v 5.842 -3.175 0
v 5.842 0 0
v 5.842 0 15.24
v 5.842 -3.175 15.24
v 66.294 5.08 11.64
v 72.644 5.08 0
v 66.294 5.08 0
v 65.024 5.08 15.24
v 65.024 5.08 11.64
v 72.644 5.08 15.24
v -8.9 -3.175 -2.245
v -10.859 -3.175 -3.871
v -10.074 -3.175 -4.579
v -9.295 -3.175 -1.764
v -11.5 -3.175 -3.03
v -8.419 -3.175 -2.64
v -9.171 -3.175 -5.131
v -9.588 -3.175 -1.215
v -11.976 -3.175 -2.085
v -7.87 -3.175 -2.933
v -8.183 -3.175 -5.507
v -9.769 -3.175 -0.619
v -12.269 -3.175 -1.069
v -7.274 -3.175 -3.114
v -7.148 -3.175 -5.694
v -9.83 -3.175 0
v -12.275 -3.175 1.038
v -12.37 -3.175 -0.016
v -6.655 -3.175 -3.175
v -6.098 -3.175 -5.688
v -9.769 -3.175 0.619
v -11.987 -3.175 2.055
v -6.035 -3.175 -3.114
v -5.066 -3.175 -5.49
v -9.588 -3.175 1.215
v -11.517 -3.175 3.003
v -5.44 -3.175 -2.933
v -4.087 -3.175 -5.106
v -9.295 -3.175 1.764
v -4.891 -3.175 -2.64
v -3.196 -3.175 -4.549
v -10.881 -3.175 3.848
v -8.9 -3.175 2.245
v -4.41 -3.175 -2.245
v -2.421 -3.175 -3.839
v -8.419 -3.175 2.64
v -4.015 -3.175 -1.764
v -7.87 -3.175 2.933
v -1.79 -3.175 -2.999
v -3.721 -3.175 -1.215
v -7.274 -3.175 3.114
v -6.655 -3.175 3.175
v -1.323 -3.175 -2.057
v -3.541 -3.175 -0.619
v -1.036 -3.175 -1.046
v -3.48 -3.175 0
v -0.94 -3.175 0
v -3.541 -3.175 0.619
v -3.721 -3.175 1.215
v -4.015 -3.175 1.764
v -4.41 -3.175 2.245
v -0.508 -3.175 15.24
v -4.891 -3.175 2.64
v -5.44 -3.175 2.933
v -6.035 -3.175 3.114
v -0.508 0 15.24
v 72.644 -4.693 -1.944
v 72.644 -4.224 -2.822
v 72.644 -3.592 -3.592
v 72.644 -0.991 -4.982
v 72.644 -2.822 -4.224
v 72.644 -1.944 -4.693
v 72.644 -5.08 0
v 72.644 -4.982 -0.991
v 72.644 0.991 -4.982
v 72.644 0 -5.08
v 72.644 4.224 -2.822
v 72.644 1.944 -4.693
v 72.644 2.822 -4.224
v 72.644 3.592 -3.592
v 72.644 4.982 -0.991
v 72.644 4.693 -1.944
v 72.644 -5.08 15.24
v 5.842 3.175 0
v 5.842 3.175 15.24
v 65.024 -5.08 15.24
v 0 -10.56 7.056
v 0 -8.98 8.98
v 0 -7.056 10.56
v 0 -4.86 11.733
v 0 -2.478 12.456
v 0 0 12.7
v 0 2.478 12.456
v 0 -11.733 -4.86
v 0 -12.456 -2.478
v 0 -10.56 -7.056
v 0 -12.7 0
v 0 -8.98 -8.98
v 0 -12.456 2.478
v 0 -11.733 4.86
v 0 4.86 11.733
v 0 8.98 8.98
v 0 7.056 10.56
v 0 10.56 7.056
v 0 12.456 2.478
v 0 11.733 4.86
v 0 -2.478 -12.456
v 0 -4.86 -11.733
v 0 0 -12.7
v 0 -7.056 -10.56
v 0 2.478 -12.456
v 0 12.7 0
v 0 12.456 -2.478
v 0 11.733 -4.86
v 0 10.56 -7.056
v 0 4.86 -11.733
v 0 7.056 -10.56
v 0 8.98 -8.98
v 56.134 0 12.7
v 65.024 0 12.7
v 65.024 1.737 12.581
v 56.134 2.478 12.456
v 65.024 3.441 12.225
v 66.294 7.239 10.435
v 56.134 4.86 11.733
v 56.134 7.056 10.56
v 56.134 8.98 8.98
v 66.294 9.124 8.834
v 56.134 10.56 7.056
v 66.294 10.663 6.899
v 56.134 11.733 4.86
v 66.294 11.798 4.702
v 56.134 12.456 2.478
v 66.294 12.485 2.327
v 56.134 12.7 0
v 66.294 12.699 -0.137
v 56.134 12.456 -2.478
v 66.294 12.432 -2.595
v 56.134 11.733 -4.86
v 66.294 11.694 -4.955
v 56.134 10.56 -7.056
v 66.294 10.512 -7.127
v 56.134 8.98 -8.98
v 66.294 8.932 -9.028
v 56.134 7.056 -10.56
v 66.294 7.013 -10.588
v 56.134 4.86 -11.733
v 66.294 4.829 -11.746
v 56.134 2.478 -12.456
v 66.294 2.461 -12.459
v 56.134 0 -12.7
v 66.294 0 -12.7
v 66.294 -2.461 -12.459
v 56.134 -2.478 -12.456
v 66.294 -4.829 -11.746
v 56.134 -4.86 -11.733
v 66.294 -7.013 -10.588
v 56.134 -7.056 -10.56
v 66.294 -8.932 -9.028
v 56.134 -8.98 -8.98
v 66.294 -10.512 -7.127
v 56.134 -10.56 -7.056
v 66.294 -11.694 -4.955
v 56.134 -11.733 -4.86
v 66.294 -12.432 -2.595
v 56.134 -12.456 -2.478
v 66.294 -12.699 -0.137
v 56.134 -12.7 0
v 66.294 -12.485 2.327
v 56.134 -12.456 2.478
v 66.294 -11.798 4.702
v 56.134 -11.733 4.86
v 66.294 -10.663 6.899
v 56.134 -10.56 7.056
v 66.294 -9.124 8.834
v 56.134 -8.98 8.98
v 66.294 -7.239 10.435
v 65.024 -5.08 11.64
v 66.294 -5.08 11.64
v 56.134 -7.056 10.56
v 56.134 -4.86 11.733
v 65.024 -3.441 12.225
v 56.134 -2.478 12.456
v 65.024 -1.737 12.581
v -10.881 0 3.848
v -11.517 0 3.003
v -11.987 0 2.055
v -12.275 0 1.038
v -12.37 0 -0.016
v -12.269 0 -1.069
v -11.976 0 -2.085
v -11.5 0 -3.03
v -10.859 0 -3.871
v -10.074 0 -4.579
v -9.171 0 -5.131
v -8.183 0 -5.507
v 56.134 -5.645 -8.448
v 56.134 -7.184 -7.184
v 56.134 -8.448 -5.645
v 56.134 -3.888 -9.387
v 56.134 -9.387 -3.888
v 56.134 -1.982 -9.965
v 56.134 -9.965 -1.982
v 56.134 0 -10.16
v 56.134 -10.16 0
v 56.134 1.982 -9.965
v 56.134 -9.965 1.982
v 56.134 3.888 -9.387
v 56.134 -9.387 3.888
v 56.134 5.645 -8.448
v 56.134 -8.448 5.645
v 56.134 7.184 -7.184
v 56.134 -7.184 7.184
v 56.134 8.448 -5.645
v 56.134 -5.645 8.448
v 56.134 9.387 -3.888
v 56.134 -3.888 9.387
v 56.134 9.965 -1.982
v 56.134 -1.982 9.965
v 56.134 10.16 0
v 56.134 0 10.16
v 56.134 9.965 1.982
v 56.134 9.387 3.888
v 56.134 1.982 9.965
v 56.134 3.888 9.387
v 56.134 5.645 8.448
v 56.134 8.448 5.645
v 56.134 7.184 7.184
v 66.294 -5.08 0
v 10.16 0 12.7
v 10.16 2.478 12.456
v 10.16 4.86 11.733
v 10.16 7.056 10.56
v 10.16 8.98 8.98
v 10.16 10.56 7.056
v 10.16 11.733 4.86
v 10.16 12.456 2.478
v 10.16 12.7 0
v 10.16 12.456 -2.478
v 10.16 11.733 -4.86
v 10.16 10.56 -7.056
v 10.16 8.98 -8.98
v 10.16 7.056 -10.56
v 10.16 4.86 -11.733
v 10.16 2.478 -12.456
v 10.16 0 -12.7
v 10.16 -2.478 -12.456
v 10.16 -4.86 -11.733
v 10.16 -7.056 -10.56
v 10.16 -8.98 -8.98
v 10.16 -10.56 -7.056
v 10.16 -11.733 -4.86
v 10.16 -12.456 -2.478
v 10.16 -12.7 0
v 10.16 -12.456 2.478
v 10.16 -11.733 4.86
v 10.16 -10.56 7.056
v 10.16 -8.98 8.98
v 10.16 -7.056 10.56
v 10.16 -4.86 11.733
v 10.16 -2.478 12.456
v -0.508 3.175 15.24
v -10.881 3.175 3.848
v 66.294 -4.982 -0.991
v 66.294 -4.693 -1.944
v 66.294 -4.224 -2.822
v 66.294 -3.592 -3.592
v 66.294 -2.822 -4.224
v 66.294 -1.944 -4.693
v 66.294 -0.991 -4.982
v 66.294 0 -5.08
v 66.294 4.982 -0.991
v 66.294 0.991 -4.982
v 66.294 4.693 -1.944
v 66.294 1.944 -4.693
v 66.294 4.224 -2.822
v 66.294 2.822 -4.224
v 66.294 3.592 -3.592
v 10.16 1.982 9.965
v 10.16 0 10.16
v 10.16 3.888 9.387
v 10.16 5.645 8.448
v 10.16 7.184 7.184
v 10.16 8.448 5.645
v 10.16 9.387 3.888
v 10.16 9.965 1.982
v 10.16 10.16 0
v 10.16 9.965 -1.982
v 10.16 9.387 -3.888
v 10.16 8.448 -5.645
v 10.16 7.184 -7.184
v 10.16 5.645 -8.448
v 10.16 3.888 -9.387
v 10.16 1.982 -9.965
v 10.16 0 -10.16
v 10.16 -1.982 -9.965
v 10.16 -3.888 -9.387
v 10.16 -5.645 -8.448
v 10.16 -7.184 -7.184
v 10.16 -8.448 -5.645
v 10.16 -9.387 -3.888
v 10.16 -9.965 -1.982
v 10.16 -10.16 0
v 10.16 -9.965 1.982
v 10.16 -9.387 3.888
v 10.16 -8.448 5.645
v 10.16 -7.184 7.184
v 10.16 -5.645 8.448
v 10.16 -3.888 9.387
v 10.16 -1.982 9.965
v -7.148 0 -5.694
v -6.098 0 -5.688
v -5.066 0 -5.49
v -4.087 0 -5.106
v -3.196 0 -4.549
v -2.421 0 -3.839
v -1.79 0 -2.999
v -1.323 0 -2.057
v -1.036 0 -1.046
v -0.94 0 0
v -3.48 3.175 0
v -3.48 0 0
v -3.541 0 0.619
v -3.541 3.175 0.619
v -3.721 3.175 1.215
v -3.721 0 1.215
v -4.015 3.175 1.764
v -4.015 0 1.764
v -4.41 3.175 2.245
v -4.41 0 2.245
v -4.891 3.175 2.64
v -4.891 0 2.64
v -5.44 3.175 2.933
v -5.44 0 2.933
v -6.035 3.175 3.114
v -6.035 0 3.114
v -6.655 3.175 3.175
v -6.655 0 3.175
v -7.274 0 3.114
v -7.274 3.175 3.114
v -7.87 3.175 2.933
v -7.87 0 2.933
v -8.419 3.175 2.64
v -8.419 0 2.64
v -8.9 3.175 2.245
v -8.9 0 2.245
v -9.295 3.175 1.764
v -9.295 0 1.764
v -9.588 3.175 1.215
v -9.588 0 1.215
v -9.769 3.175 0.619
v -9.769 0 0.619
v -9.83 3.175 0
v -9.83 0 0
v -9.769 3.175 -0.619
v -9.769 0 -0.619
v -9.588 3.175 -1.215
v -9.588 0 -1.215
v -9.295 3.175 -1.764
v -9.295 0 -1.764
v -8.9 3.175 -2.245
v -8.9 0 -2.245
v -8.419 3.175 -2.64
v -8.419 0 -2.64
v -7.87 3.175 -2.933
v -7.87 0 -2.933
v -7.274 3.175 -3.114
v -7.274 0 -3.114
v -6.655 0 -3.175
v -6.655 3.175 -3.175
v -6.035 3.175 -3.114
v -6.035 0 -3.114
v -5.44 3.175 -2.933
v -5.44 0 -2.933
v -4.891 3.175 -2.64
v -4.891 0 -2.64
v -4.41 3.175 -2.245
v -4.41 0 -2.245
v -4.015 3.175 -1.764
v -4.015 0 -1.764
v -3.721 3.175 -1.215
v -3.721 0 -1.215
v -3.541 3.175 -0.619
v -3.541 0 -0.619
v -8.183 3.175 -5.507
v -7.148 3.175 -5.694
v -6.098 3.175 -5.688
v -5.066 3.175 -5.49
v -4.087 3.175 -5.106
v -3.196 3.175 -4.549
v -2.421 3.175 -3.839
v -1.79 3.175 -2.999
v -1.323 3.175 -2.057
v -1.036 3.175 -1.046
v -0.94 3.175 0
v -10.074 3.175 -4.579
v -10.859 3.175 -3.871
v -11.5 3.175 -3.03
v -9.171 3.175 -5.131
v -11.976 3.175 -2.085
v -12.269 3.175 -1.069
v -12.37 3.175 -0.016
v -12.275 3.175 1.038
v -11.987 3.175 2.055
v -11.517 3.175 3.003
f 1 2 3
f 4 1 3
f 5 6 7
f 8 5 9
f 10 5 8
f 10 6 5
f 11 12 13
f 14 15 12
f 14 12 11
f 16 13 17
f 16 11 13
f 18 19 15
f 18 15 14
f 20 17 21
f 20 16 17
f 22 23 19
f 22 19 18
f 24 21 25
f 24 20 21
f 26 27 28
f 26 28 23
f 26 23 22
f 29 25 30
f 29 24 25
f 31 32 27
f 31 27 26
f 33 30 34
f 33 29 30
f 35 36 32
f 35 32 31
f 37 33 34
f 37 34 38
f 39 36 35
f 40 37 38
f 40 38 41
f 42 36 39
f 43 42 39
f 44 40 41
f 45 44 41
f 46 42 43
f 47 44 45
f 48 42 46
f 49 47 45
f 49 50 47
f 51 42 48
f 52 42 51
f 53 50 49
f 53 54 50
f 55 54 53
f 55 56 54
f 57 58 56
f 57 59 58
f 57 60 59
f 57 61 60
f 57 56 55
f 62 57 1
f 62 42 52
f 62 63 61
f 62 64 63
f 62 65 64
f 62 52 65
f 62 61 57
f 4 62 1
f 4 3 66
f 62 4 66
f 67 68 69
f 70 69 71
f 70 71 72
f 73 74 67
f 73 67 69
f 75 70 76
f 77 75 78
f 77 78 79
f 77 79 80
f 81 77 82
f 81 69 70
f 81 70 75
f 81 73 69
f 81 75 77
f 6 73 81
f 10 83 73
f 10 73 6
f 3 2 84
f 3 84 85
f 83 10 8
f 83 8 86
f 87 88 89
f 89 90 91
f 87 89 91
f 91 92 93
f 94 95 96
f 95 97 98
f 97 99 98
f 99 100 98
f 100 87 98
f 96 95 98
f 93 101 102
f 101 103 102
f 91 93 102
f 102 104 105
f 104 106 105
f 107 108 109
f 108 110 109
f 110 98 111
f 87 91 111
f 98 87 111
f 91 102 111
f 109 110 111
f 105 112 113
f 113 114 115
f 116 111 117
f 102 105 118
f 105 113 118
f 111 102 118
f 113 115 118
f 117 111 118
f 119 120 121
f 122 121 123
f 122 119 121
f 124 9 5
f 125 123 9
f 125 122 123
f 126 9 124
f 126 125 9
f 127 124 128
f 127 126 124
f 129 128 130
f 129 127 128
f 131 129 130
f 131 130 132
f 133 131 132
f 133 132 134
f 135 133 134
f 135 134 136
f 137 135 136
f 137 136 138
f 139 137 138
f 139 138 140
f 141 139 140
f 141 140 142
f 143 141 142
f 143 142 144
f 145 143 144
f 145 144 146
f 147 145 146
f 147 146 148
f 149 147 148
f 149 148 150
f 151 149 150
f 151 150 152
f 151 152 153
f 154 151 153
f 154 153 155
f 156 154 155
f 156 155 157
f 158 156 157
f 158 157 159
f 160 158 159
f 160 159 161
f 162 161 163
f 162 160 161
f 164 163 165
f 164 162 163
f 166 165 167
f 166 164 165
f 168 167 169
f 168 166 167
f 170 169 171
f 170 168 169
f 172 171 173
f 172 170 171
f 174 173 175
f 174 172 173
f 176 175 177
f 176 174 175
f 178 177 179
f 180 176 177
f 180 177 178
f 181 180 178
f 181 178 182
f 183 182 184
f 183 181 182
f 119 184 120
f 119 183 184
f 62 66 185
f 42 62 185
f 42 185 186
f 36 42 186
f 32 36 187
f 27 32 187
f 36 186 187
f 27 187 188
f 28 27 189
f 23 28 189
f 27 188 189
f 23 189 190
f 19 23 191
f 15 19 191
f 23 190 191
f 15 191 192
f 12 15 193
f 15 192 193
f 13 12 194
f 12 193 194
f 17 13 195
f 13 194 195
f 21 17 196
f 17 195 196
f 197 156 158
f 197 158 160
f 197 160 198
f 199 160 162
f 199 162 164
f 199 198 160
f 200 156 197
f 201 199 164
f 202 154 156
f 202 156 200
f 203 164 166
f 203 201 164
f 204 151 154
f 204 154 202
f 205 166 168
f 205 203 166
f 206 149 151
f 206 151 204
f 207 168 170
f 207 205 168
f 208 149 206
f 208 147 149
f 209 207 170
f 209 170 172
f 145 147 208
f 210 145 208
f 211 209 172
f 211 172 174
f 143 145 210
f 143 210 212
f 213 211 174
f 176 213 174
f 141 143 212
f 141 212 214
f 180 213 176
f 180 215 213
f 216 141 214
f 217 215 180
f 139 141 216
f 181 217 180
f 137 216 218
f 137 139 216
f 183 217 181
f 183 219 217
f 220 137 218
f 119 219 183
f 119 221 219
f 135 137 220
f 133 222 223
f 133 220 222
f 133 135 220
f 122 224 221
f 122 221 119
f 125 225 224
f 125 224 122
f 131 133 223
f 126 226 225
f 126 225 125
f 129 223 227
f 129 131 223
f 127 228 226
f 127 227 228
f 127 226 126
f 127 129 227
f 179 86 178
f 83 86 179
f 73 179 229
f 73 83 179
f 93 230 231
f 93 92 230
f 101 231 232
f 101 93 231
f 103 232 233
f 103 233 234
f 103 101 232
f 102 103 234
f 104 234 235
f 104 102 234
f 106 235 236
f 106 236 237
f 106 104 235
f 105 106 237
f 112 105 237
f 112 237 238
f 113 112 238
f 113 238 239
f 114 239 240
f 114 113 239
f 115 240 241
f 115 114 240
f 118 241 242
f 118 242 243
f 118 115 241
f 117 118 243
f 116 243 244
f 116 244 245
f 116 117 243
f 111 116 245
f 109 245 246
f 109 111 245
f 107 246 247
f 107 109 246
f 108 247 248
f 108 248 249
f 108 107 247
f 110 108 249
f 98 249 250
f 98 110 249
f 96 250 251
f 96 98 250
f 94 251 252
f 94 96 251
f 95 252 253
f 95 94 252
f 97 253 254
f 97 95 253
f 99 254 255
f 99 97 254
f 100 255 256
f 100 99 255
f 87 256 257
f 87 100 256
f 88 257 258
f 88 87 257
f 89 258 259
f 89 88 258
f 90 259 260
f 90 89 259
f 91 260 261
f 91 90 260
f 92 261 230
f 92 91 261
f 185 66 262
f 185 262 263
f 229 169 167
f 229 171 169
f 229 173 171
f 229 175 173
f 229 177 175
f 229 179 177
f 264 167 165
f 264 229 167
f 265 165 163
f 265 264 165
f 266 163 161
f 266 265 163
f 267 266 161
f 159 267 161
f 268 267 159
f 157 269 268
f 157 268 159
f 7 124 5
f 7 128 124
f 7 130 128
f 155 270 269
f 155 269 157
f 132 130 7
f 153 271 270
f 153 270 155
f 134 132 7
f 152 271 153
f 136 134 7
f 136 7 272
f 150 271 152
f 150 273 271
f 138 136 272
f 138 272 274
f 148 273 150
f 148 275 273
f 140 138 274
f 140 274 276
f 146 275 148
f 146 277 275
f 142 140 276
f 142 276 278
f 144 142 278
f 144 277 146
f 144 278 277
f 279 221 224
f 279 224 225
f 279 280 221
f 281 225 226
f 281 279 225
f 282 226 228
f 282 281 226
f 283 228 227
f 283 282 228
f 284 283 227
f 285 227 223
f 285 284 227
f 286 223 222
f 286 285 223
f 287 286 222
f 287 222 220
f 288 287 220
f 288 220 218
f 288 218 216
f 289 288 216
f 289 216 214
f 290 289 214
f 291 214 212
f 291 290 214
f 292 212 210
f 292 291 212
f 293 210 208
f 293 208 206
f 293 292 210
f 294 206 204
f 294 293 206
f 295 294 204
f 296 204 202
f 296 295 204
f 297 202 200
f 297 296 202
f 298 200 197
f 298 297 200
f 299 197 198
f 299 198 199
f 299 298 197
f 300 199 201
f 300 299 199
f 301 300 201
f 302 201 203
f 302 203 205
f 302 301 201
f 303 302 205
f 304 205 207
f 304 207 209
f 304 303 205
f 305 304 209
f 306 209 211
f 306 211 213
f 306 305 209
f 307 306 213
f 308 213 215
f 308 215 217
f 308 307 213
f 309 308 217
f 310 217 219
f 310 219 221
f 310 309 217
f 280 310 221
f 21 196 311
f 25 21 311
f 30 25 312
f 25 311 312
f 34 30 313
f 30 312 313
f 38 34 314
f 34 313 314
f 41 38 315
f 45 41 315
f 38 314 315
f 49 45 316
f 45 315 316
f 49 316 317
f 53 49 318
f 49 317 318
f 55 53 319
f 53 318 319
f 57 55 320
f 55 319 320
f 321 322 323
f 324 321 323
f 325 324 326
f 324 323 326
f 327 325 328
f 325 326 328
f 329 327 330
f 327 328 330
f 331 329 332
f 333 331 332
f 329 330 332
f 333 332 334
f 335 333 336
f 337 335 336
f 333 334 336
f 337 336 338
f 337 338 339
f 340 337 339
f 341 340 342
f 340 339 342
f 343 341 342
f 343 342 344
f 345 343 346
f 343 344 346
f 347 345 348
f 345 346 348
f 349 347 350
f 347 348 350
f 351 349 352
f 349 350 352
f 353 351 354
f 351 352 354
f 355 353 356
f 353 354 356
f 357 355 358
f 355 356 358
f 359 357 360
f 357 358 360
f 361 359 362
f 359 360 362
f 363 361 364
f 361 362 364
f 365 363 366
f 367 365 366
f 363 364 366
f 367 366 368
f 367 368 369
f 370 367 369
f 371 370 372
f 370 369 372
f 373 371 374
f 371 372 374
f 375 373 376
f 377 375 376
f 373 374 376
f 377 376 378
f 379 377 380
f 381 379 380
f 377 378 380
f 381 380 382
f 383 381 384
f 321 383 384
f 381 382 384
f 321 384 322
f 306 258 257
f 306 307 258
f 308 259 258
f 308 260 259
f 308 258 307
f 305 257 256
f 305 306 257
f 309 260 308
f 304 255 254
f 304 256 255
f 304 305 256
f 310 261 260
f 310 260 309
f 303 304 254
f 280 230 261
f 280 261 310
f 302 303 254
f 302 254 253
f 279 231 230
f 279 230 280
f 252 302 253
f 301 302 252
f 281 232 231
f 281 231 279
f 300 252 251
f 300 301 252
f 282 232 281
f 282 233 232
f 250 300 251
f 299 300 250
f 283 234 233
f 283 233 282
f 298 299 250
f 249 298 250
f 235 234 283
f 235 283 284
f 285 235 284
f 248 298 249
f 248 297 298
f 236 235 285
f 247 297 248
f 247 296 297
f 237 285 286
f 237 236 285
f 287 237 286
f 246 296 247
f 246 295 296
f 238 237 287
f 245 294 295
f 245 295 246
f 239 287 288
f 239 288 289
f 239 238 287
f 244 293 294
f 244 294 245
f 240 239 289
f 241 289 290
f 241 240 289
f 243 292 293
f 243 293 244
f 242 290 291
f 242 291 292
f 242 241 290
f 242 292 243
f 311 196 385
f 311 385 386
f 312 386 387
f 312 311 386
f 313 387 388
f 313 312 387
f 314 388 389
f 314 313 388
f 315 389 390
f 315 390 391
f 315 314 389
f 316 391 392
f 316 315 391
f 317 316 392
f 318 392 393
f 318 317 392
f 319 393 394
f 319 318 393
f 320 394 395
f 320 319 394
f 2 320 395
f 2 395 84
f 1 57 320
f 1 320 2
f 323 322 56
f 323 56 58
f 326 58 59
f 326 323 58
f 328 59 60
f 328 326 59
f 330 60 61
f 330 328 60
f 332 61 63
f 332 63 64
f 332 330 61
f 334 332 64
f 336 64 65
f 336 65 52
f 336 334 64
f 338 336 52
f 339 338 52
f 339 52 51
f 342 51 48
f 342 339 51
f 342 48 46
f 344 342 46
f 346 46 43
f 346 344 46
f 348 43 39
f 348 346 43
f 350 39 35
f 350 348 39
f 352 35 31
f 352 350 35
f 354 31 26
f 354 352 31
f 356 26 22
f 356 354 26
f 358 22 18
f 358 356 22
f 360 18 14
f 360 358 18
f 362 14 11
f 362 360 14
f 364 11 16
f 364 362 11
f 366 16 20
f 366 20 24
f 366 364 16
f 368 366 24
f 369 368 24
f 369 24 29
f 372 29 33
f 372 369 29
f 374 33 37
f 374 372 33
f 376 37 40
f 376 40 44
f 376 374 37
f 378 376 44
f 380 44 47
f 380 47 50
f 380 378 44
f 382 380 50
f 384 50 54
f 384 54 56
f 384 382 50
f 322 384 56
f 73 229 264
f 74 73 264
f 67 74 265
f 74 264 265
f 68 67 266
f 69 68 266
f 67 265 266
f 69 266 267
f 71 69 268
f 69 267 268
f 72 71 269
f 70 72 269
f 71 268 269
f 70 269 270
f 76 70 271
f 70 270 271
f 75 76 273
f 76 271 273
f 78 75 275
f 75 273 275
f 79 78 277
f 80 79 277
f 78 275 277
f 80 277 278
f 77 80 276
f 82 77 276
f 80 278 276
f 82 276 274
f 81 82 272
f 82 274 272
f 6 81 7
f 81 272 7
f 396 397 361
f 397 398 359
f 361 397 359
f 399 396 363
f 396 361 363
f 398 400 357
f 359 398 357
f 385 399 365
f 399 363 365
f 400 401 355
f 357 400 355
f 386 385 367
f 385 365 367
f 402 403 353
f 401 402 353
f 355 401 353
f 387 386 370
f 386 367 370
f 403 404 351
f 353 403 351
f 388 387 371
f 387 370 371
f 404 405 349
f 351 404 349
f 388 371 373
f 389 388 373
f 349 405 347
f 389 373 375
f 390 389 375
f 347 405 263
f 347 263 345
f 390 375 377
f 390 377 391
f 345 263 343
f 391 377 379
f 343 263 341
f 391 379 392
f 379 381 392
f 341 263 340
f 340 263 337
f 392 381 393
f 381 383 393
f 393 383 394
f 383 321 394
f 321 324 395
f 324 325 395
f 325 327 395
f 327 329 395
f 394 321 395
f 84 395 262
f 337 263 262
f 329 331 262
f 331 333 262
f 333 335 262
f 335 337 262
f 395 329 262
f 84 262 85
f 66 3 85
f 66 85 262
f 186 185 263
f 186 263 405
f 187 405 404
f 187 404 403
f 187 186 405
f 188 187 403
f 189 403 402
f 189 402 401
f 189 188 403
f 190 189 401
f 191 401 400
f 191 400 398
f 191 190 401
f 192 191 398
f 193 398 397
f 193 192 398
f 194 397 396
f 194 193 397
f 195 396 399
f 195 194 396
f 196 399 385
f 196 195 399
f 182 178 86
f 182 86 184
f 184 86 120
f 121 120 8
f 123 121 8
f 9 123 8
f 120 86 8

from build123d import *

# Parameters (mm, degrees)
F0_W          = 5.842
F0_H          = 12.7
F2_R          = 1.524
F3_DEPTH      = 6.35
F3_DEPTH_BACK = 1.27
F0_R          = 3.175
F5_DEPTH      = 3.175


# Not quite as in the source:
# - the program builds the solid bodies; features that only make, move or delete a surface that nothing else refers to are left out


with BuildPart() as f1:
    # F0 (on Front) → F1 (revolve)
    with BuildSketch(Plane.XZ):
        with Locations((2.921, 6.35)):
            Rectangle(F0_W, F0_H)
        Polygon((5.842, 12.7), (5.842, 0), (66.294, 0), (66.294, 12.7), (56.134, 12.7), (56.134, 10.16), (10.16, 10.16), (10.16, 12.7), align=None)
    revolve(axis=Axis((33.147, 0, 0), (-1, 0, 0)))

    # F2 (on face) → F3 (join, two sides)
    with BuildSketch(Plane.YZ.offset(66.294)) as f3_sk:
        with BuildLine():
            ThreePointArc((-5.08, 0), (0, 5.08), (5.08, 0))
            Line((5.08, 0), (5.08, 11.6397422652))
            ThreePointArc((5.08, 11.6397422652), (0, 12.7), (-5.08, 11.6397422652))
            Line((-5.08, 11.6397422652), (-5.08, 0))
        make_face()
        with BuildLine():
            ThreePointArc((-5.08, 11.6397422652), (0, 12.7), (5.08, 11.6397422652))
            Line((5.08, 11.6397422652), (5.08, 15.24))
            Line((5.08, 15.24), (-5.08, 15.24))
            Line((-5.08, 15.24), (-5.08, 11.6397422652))
        make_face()
        with BuildLine():
            ThreePointArc((-5.08, 0), (0, -5.08), (5.08, 0))
            ThreePointArc((5.08, 0), (0, 5.08), (-5.08, 0))
        make_face()
        Circle(F2_R, mode=Mode.SUBTRACT)
        Circle(F2_R)
    extrude(amount=F3_DEPTH)
    extrude(f3_sk.sketch, amount=-F3_DEPTH_BACK)


with BuildPart() as f5:
    # F0 (on Front) → F5 (new body, symmetric)
    with BuildSketch(Plane.XZ):
        with BuildLine():
            Line((-0.9398, 0), (0, 0))
            Line((0, 0), (0, 12.7))
            Line((0, 12.7), (5.842, 12.7))
            Line((5.842, 12.7), (5.842, 15.24))
            Line((5.842, 15.24), (-0.508, 15.24))
            Line((-0.508, 15.24), (-10.8806298187, 3.8475430269))
            ThreePointArc((-10.8806298187, 3.8475430269), (-4.5919612295, 5.3297205562), (-0.9398, 0))
        make_face()
        with BuildLine():
            ThreePointArc((-8.1826630726, -5.5069827884), (-3.1957909266, -4.5493385486), (-0.9398, 0))
            ThreePointArc((-0.9398, 0), (-4.5919612295, 5.3297205562), (-10.8806298187, 3.8475430269))
            ThreePointArc((-10.8806298187, 3.8475430269), (-12.1459778134, -1.5837270034), (-8.1826630726, -5.5069827884))
        make_face()
        with Locations((-6.6548, 0)):
            Circle(F0_R, mode=Mode.SUBTRACT)
        with Locations((2.921, 6.35)):
            Rectangle(F0_W, F0_H)
    extrude(amount=F5_DEPTH, both=True)


solid = Compound([f1.part, f5.part])
